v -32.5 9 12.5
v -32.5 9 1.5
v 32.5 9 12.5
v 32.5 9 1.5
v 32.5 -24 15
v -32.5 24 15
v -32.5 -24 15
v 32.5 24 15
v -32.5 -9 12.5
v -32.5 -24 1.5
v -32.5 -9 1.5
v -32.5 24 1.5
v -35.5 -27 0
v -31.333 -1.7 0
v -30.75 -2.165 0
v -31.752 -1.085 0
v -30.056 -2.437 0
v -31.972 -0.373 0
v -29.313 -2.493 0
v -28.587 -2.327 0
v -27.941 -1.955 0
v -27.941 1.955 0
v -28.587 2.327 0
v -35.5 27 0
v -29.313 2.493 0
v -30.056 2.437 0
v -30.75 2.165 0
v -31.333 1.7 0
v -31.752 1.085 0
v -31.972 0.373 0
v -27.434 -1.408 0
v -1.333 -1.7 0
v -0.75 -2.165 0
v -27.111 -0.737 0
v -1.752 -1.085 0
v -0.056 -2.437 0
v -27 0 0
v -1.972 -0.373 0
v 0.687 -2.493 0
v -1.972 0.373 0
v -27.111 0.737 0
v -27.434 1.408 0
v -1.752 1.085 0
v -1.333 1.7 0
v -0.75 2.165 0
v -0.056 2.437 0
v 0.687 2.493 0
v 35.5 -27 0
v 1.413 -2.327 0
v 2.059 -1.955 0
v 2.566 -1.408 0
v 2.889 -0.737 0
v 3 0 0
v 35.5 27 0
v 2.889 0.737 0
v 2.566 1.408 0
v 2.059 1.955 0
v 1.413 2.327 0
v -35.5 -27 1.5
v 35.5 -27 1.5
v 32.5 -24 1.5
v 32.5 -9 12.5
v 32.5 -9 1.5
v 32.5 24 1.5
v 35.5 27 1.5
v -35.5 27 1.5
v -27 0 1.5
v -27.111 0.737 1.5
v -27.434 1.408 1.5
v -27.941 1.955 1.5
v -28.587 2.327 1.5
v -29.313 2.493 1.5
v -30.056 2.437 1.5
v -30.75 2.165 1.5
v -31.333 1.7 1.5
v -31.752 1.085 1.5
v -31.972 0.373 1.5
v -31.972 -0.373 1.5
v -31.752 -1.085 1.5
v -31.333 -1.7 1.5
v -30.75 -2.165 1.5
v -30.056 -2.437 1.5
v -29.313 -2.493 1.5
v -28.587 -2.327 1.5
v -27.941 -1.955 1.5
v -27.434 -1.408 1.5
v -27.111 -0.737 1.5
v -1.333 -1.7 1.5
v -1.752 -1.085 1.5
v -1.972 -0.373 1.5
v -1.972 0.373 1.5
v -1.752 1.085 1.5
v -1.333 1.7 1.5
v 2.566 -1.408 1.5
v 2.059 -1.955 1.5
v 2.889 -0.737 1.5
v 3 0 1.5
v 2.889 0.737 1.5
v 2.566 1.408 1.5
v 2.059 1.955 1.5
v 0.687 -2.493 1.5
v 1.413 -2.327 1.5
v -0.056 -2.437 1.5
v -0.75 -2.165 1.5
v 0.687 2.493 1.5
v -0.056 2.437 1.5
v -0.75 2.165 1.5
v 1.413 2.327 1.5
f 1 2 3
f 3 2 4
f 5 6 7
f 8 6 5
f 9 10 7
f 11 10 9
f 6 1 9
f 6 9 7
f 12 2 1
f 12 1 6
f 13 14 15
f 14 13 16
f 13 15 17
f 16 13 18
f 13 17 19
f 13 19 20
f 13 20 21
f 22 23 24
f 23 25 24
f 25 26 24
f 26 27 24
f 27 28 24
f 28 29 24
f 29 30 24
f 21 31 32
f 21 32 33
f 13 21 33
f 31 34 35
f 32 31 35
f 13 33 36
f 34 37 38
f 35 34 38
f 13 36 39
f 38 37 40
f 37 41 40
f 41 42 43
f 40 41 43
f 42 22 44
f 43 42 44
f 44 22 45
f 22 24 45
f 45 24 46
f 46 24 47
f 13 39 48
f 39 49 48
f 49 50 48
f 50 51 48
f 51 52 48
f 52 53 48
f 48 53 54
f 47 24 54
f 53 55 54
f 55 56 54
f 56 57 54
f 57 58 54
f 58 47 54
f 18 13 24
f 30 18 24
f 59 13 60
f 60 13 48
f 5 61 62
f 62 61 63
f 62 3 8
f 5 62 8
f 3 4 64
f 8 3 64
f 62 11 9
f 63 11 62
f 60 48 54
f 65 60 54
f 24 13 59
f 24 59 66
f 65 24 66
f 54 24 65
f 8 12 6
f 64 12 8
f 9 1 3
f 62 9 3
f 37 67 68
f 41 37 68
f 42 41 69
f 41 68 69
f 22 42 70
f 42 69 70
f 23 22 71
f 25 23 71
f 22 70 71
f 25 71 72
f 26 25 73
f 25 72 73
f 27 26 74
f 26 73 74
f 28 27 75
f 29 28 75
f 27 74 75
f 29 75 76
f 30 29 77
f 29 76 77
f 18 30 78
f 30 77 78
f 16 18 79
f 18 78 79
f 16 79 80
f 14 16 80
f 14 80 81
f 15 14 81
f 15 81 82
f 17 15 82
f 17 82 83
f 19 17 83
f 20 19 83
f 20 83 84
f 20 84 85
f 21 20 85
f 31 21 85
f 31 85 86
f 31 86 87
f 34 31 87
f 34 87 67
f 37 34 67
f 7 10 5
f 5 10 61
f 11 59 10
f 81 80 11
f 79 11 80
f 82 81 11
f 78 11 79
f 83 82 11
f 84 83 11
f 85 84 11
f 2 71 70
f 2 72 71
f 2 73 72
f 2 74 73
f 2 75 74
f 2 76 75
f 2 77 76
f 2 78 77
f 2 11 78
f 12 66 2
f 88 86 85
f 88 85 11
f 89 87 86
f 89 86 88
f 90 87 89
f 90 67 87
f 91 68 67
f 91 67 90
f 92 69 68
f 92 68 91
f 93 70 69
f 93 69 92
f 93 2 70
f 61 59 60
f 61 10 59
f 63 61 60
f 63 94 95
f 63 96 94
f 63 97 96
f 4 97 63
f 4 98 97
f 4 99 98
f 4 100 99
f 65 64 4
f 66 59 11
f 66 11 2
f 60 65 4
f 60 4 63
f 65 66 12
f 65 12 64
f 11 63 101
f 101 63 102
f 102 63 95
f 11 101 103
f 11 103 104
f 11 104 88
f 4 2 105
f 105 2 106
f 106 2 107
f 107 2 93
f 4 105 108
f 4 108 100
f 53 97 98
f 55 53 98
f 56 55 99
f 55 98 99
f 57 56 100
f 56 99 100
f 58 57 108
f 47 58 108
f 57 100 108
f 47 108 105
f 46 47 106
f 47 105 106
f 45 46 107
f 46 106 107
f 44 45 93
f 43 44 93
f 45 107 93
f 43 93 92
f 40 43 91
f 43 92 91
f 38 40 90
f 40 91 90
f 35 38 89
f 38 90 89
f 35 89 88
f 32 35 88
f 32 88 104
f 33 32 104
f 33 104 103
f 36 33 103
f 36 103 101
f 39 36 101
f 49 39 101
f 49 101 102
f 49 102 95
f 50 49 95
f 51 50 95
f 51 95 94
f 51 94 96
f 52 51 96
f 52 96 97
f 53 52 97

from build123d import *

# Parameters (mm, degrees)
F0_W     = 71
F0_H     = 54
F1_DEPTH = 1.5
F2_R     = 2.5
F3_DEPTH = 25
F4_W     = 65
F4_H     = 15
F5_DEPTH = 11
F6_W     = 65
F6_H     = 48
F7_DEPTH = 2.5


with BuildPart() as f1:
    # F0 (on Top) → F1 (new body)
    with BuildSketch(Plane.XY):
        Rectangle(F0_W, F0_H)
    extrude(amount=F1_DEPTH)

    # F2 (on face) → F3 (cut)
    with BuildSketch(Plane.XY.offset(1.5)):
        with Locations((-29.5, 0)):
            Circle(F2_R)
        with Locations((0.5, 0)):
            Circle(F2_R)
    extrude(amount=-F3_DEPTH, mode=Mode.SUBTRACT)

    # F4 (on face) → F5 (join)
    with BuildSketch(Plane.XY.offset(1.5)):
        with Locations((0, 16.5)):
            Rectangle(F4_W, F4_H)
        with Locations((0, -16.5)):
            Rectangle(F4_W, F4_H)
    extrude(amount=F5_DEPTH)

    # F6 (on face) → F7 (join)
    with BuildSketch(Plane.XY.offset(12.5)):
        Rectangle(F6_W, F6_H)
    extrude(amount=F7_DEPTH)


solid = f1.part
